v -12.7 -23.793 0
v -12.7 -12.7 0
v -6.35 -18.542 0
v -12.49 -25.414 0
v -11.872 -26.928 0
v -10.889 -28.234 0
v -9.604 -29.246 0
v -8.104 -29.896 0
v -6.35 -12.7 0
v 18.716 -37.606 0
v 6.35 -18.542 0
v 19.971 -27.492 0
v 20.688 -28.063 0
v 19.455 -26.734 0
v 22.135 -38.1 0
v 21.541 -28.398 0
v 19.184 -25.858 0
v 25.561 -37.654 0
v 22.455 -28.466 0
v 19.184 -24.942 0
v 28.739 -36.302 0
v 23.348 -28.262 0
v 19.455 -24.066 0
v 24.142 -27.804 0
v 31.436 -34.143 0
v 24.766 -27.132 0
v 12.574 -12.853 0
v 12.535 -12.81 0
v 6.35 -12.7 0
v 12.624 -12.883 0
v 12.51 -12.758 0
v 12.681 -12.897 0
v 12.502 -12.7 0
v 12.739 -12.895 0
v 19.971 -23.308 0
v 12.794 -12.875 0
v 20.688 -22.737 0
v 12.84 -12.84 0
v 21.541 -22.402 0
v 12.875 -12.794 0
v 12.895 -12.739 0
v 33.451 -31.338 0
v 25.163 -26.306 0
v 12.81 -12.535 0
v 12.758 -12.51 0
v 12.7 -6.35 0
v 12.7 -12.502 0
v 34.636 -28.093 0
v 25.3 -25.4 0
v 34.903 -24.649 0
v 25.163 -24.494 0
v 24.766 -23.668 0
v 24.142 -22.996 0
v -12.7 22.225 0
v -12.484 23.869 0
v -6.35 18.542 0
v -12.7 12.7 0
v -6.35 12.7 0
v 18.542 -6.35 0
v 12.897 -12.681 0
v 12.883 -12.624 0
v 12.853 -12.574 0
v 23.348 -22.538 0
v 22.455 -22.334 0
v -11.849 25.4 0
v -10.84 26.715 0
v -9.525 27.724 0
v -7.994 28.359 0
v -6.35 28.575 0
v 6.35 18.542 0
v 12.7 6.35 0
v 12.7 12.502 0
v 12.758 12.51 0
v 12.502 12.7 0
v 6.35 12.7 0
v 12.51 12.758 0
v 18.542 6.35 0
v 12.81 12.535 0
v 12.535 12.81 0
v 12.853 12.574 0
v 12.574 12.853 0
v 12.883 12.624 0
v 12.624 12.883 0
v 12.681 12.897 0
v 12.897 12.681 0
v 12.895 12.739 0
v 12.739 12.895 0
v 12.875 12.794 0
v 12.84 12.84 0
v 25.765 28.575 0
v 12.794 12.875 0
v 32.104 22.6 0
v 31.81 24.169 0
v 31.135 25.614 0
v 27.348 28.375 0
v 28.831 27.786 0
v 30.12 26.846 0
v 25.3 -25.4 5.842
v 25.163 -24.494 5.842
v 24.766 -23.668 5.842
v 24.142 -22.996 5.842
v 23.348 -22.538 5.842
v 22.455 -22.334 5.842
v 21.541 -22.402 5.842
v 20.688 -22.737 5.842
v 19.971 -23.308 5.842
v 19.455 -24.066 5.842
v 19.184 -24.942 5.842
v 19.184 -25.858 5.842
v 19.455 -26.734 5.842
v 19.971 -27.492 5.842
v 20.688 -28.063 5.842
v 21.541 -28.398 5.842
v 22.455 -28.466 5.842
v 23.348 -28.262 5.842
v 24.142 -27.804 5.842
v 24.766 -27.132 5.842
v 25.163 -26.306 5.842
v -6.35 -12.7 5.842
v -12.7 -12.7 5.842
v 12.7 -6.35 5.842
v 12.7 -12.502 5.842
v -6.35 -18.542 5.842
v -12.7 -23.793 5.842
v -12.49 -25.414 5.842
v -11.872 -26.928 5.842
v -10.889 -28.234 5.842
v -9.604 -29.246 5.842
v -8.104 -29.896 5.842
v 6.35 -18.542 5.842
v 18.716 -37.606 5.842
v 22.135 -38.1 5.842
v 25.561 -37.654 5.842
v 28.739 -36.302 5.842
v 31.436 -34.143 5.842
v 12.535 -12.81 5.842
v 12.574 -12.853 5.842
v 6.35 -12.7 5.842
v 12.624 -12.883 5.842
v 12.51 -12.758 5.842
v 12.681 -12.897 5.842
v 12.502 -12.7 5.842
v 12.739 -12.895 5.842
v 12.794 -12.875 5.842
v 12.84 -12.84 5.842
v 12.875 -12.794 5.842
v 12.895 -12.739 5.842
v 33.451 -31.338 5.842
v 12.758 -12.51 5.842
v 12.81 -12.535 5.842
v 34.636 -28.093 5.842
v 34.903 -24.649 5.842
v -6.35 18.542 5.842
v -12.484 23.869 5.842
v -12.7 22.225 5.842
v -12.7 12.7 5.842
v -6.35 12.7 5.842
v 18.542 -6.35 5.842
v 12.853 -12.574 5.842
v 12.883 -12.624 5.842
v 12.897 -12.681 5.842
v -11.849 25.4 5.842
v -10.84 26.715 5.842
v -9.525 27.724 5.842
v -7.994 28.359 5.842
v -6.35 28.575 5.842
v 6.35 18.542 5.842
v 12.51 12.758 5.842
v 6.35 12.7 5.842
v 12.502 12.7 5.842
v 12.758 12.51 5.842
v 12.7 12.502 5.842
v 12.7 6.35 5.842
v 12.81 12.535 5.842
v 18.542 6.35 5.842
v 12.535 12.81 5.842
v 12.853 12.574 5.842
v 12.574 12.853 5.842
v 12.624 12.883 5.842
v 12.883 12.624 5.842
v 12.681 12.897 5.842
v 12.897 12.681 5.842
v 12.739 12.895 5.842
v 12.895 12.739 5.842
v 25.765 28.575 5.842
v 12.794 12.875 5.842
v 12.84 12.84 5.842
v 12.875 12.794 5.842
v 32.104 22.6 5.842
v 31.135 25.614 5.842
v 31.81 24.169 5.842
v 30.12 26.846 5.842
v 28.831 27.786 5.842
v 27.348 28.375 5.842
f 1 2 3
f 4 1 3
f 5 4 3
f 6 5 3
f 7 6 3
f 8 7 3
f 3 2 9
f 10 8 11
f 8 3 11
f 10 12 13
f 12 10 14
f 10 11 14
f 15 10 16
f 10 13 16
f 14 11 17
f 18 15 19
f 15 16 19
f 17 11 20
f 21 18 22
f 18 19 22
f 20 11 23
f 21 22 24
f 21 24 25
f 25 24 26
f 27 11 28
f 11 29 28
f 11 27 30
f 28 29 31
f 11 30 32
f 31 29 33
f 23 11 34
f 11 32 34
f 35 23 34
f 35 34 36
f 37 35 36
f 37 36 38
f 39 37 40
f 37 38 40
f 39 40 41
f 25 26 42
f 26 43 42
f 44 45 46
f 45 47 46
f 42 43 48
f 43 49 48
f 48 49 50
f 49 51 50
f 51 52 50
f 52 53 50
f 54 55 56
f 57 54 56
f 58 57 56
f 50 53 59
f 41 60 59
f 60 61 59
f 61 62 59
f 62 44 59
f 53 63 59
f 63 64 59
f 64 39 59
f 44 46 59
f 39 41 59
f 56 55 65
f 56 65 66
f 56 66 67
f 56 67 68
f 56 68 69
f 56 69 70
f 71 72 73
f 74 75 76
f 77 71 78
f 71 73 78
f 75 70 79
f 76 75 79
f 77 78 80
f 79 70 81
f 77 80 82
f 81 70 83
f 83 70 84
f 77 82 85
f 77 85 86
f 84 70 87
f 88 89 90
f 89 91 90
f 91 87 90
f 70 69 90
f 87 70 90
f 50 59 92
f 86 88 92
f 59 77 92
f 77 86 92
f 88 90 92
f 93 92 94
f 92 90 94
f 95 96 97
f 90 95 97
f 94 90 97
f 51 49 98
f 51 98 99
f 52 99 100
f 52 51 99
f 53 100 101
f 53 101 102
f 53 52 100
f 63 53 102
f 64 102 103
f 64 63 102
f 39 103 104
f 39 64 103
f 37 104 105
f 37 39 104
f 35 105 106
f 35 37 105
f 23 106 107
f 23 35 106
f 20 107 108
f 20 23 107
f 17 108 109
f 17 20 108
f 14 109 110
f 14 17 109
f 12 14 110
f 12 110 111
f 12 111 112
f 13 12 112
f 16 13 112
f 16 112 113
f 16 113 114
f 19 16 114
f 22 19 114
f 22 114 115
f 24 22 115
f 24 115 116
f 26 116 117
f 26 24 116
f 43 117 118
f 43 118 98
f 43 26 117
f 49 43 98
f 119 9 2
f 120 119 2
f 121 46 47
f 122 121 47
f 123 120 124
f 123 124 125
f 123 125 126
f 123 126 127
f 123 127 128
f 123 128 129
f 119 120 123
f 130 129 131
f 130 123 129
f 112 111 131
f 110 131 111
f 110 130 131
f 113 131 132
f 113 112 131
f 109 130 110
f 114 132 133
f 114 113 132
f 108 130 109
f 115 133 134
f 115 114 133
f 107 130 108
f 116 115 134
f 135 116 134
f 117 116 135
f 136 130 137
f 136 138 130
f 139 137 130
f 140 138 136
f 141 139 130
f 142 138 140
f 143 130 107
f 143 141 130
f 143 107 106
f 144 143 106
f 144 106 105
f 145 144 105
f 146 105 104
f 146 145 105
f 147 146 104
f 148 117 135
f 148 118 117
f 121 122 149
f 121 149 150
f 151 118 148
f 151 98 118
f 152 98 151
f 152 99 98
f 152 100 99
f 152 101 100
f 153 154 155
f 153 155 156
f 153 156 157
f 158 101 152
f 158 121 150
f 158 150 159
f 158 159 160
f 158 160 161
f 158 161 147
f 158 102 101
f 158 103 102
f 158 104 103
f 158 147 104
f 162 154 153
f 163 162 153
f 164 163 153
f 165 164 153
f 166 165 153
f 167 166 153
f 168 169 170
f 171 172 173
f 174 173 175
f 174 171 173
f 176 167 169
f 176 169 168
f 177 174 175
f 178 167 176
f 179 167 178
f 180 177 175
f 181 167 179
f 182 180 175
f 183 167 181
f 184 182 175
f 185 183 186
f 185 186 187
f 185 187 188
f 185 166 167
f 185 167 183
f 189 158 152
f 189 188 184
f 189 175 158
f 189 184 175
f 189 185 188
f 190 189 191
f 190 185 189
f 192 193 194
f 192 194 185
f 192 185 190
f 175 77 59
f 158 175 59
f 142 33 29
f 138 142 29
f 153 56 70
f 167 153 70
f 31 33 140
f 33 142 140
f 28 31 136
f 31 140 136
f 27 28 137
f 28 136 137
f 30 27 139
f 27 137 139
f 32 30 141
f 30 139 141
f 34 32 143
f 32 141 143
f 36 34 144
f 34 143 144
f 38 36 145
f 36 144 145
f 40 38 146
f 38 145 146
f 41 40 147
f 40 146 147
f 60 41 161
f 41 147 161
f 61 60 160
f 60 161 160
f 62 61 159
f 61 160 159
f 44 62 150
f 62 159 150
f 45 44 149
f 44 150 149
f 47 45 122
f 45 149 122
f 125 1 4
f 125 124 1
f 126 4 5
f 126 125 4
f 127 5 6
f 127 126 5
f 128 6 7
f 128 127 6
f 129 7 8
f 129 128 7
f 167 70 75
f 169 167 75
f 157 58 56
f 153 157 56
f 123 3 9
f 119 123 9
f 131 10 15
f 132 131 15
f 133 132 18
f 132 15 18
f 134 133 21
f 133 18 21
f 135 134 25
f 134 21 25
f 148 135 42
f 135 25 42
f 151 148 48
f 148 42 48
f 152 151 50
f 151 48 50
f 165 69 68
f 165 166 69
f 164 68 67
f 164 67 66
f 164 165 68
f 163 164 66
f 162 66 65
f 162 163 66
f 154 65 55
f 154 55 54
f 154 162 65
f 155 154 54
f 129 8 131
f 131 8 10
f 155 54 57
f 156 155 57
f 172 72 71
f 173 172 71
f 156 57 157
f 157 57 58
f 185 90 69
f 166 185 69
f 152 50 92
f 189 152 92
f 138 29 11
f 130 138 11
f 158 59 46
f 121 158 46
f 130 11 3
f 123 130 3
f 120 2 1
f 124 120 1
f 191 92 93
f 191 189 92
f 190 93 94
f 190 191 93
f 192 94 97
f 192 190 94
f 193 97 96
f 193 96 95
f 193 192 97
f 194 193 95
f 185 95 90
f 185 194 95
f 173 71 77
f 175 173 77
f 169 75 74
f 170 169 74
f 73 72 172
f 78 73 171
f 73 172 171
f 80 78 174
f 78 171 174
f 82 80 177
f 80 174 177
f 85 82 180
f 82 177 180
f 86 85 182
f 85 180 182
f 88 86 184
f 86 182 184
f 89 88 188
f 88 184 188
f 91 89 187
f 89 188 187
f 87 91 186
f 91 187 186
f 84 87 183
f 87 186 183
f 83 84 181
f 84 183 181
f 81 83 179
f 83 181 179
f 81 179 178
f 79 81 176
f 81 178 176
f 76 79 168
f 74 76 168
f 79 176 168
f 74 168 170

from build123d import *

# Parameters (mm, degrees)
SKETCH1_R           = 3.075
BOSS_EXTRUDE1_DEPTH = 5.842
FILLET1_R           = 6.35
SKETCH2_R           = 0.1984375
CUT_EXTRUDE1_DEPTH  = 53.014369063


with BuildPart() as part:
    # Sketch1 → Boss-Extrude1 (new body)
    with BuildSketch(Plane.XY):
        with BuildLine():
            Line((12.7, -12.7), (6.35, -12.7))
            Line((6.35, -12.7), (6.35, -18.542))
            Line((6.35, -18.542), (-6.35, -18.542))
            Line((-6.35, -18.542), (-6.35, -12.7))
            Line((-6.35, -12.7), (-12.7, -12.7))
            Line((-12.7, -12.7), (-12.7, -28.575))
            Line((-12.7, -28.575), (18.716430351, -37.605733858))
            ThreePointArc((18.716430351, -37.605733858), (30.161479232, -35.314751505), (34.902776944, -24.649019461))
            Line((34.902776944, -24.649019461), (31.75, 28.575))
            Line((31.75, 28.575), (-12.7, 28.575))
            Line((-12.7, 28.575), (-12.7, 12.7))
            Line((-12.7, 12.7), (-6.35, 12.7))
            Line((-6.35, 12.7), (-6.35, 18.542))
            Line((-6.35, 18.542), (6.35, 18.542))
            Line((6.35, 18.542), (6.35, 12.7))
            Line((6.35, 12.7), (12.7, 12.7))
            Line((12.7, 12.7), (12.7, 6.35))
            Line((12.7, 6.35), (18.542, 6.35))
            Line((18.542, 6.35), (18.542, -6.35))
            Line((18.542, -6.35), (12.7, -6.35))
            Line((12.7, -6.35), (12.7, -12.7))
        make_face()
        with Locations((22.225, -25.4)):
            Circle(SKETCH1_R, mode=Mode.SUBTRACT)
    extrude(amount=BOSS_EXTRUDE1_DEPTH)

    # Fillet1
    fillet1_edges = [part.edges().sort_by_distance(p)[0] for p in [
        (-12.7, 28.575, 2.921),
        (31.75, 28.575, 2.921),
        (-12.7, -28.575, 2.921),
    ]]
    fillet(fillet1_edges, radius=FILLET1_R)

    # Sketch2 → Cut-Extrude1 (cut, through all)
    with BuildSketch(Plane.XY.offset(5.842)):
        with Locations((12.7, 12.7)):
            Circle(SKETCH2_R)
        with Locations((12.7, -12.7)):
            Circle(SKETCH2_R)
    extrude(amount=-CUT_EXTRUDE1_DEPTH, mode=Mode.SUBTRACT)


solid = part.part
